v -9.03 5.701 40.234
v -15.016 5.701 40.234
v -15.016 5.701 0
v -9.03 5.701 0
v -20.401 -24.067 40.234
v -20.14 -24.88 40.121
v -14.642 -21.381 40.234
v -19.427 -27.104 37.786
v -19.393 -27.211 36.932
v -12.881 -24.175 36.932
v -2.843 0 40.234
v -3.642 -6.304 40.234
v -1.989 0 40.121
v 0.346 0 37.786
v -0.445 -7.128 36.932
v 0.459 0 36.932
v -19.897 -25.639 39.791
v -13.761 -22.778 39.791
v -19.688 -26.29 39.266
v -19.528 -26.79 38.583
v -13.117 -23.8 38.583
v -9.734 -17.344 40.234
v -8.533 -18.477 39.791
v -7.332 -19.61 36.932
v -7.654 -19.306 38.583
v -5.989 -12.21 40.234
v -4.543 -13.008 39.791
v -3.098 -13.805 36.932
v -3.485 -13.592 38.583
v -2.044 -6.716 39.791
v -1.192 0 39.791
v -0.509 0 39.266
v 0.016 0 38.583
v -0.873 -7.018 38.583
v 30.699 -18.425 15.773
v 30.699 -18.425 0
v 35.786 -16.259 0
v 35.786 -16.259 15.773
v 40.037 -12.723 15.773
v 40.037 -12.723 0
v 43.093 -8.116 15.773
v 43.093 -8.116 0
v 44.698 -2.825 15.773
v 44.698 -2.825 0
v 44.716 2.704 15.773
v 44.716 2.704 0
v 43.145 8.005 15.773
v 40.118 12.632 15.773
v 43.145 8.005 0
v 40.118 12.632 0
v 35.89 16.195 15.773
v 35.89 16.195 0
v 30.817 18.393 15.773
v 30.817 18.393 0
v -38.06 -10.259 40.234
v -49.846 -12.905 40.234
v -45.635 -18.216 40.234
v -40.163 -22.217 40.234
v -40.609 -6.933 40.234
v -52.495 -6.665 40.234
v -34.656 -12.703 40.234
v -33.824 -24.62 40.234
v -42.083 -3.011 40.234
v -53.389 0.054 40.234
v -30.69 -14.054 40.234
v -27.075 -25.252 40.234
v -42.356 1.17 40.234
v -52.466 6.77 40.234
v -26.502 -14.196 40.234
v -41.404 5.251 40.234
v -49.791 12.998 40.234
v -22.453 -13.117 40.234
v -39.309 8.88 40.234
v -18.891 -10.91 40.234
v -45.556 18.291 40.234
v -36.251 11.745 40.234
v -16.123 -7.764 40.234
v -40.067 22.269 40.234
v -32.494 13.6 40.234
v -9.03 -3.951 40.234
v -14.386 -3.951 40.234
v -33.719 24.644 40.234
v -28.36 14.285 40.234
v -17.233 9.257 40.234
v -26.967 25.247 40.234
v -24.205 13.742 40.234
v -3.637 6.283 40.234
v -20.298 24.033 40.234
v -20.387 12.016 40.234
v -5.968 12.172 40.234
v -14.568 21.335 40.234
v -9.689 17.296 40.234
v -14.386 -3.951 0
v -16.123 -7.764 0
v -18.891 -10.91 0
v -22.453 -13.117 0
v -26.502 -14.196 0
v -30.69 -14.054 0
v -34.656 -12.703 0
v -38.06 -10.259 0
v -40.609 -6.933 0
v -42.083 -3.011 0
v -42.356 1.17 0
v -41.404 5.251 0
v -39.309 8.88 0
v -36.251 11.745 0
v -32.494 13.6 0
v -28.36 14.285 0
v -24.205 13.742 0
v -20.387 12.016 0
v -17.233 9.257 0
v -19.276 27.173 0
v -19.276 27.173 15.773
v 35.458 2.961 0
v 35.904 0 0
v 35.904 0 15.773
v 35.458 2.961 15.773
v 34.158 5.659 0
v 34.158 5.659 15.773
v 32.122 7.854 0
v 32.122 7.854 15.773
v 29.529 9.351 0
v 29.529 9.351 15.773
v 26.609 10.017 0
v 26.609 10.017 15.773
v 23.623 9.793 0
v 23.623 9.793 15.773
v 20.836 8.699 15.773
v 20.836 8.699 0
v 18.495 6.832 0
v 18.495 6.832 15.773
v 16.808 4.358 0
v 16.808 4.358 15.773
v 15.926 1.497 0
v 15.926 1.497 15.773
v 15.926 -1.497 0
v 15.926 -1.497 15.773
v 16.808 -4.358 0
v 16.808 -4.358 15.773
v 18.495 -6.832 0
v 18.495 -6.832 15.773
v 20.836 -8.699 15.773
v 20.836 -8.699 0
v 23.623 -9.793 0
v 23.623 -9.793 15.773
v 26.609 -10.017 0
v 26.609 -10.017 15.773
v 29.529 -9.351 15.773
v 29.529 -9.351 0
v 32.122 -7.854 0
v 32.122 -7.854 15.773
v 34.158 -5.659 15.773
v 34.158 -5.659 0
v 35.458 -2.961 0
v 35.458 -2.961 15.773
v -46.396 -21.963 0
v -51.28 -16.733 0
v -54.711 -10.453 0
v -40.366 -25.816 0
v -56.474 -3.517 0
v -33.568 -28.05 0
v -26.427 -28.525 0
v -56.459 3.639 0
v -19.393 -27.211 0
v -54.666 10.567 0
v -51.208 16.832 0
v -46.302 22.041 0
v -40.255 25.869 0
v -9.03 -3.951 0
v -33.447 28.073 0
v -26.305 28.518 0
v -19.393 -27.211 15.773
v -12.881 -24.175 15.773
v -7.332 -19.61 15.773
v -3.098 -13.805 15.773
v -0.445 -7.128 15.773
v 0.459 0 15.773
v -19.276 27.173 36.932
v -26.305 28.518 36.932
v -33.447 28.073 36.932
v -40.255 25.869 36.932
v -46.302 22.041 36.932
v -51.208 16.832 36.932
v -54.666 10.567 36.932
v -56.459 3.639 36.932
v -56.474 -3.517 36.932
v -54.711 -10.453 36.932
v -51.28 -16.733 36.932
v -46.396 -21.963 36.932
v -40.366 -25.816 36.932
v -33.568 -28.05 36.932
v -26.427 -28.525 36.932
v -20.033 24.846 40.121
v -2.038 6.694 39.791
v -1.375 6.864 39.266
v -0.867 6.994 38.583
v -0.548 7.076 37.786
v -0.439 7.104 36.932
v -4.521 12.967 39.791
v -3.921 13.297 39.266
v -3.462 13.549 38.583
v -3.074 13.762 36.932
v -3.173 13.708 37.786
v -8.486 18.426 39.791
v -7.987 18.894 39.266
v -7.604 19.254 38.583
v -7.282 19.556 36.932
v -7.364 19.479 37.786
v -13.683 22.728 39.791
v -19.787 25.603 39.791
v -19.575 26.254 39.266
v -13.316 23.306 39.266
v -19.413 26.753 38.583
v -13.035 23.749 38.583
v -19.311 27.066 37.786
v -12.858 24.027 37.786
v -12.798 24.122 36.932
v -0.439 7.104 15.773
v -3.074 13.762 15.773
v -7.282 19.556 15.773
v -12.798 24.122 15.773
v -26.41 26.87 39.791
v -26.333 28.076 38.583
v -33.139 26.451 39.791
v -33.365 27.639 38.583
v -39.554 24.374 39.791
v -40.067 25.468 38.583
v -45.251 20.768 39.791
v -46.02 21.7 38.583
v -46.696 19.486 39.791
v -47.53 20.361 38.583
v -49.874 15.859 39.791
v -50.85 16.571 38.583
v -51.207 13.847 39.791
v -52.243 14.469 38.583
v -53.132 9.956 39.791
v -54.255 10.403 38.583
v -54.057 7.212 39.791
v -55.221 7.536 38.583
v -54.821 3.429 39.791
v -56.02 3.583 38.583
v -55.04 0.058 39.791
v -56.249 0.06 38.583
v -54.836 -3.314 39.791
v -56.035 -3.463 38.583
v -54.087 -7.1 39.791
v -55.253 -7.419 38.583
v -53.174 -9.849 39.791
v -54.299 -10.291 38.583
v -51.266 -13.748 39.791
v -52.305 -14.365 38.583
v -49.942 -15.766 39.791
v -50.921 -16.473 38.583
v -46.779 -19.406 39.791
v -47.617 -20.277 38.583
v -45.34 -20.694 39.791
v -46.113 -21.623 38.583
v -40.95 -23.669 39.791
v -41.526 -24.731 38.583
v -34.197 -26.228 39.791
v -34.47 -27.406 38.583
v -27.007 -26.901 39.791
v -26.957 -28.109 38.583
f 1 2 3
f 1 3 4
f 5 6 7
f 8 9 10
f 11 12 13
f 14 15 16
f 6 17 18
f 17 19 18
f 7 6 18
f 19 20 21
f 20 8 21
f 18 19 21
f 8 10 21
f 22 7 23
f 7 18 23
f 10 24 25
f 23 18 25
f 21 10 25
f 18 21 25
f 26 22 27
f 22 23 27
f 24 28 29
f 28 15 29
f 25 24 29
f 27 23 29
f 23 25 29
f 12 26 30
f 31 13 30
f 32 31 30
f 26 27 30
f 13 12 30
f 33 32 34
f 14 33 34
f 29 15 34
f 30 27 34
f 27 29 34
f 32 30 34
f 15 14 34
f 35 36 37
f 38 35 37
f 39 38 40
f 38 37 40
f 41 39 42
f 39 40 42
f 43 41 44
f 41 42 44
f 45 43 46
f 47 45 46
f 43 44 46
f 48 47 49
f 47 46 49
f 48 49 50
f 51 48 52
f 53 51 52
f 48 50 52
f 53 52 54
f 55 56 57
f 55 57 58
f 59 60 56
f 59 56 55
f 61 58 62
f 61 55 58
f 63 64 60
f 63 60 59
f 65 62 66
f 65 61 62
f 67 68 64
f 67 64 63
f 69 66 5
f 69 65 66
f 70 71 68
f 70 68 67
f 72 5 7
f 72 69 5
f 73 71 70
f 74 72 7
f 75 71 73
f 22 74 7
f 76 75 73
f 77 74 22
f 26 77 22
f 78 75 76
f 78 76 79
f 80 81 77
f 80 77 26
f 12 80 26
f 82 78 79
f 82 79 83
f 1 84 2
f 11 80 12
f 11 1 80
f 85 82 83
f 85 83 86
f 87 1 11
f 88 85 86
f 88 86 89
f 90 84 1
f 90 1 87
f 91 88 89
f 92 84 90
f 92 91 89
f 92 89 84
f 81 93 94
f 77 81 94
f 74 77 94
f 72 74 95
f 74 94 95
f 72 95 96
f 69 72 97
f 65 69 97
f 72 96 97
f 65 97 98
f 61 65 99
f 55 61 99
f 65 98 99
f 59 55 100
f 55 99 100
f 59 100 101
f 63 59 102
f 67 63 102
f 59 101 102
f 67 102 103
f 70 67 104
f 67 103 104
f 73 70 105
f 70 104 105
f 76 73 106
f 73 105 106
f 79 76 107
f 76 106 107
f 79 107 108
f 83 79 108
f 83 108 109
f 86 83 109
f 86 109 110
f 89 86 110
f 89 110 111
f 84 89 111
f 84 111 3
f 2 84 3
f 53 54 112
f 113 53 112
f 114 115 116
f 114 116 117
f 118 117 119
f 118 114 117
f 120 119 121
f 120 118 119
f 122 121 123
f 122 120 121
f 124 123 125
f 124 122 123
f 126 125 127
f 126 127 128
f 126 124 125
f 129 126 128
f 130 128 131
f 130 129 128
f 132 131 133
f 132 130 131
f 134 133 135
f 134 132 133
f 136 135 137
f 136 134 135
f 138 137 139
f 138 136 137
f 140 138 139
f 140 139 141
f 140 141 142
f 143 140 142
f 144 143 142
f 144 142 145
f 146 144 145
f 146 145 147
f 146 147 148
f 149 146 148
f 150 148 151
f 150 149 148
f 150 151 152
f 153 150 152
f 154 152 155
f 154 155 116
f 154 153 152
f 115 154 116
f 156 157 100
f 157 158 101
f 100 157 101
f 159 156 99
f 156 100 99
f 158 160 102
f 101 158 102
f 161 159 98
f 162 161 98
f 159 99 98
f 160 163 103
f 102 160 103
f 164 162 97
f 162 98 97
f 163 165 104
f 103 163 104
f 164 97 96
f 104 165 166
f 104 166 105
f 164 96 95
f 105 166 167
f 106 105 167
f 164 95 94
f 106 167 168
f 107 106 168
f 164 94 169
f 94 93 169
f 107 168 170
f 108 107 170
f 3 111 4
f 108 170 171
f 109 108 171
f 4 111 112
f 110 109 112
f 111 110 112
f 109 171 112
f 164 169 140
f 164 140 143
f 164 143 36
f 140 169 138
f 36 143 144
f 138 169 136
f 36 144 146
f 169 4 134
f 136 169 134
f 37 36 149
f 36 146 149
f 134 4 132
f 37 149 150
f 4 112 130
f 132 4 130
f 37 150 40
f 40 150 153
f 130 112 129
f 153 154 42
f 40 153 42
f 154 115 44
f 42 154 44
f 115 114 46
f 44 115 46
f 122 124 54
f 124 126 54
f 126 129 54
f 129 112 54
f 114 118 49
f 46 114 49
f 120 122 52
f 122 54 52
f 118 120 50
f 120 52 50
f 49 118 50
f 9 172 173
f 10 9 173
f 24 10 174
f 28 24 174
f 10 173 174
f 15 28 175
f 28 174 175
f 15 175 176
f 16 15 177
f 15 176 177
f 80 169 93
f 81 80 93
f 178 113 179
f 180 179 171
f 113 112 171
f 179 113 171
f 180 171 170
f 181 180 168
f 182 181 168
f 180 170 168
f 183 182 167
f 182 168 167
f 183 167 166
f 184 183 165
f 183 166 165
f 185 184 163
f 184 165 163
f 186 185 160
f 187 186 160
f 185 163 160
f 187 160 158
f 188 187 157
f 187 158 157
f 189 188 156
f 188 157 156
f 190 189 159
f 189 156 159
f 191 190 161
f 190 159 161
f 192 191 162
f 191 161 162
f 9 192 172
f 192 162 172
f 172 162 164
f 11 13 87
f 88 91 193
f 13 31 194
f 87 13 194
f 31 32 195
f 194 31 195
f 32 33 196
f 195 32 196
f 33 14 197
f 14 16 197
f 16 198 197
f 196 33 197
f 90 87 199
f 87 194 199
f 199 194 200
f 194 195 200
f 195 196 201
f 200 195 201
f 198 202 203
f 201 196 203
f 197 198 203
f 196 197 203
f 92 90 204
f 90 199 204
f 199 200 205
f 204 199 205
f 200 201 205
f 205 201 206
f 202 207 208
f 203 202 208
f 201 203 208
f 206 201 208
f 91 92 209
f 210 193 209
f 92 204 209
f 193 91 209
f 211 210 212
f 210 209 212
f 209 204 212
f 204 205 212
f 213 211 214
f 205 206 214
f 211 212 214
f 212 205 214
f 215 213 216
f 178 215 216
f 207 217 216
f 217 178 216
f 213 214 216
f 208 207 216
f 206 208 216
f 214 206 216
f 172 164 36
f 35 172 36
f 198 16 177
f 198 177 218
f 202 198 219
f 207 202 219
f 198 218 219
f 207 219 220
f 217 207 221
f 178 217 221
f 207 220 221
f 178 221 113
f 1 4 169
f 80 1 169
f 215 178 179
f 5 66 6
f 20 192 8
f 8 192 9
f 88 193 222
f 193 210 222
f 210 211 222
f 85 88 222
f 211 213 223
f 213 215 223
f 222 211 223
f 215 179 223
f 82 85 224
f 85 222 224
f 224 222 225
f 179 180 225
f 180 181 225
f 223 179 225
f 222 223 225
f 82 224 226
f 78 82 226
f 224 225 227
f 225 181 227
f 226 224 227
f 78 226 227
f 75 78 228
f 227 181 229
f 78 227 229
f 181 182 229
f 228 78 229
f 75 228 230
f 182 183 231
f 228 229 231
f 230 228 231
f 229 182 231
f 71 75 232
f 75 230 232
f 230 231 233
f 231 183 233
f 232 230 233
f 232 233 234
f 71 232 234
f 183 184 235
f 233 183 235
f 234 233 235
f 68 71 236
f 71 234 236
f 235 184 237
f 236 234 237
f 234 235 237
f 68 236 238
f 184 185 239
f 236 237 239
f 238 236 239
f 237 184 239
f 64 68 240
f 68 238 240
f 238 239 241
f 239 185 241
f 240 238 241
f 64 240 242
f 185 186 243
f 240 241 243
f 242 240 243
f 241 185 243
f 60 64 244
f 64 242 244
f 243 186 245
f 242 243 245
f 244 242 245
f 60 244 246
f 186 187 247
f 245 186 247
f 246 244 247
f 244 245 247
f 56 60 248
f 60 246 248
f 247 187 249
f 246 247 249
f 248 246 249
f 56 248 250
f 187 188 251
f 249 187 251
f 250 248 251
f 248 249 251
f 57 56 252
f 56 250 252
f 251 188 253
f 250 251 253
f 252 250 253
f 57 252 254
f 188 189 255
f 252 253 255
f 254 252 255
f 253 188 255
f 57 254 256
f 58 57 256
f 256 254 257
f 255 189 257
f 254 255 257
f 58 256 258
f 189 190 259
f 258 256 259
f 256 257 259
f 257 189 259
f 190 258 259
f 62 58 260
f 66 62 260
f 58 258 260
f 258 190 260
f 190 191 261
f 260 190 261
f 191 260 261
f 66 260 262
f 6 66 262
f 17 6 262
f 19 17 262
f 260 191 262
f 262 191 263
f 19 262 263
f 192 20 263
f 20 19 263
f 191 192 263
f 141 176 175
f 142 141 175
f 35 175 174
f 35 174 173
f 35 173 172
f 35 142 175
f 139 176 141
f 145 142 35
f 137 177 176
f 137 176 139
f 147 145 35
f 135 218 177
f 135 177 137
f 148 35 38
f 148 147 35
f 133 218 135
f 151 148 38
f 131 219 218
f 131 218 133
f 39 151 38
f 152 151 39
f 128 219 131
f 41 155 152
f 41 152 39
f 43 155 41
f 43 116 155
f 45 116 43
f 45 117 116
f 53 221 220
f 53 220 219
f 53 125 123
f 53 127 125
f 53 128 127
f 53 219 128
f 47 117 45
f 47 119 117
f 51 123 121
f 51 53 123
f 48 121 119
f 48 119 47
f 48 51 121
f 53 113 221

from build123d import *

# Parameters (mm, degrees)
F0_R     = 10.045225
F1_DEPTH = 15.7734
F2_DEPTH = 40.2336
F3_R     = 3.302


with BuildPart() as f1:
    # F0 (on Top) → F1 (new body)
    with BuildSketch(Plane.XY):
        with BuildLine():
            ThreePointArc((-19.276231, 27.17319), (-4.995638, 16.791712), (0.458613, 0))
            ThreePointArc((0.458613, 0), (-5.031754, -16.841329), (-19.39303, -27.210911))
            Line((-19.39303, -27.210911), (30.698986, -18.424801))
            ThreePointArc((30.698986, -18.424801), (44.908516, -0.061007), (30.816896, 18.393421))
            Line((30.816896, 18.393421), (-19.276231, 27.17319))
        make_face()
        with Locations((25.858613, 0)):
            Circle(F0_R, mode=Mode.SUBTRACT)
    extrude(amount=F1_DEPTH)

    # F0 (on Top) → F2 (join)
    with BuildSketch(Plane.XY):
        with BuildLine():
            ThreePointArc((-19.39303, -27.210911), (-5.031754, -16.841329), (0.458613, 0))
            ThreePointArc((0.458613, 0), (-4.995638, 16.791712), (-19.276231, 27.17319))
            ThreePointArc((-19.276231, 27.17319), (-56.691321, 0.061369), (-19.39303, -27.210911))
        make_face()
        with BuildLine():
            ThreePointArc((-14.385945, -3.95065), (-42.37357, -0.930265), (-15.015728, 5.70135))
            Line((-15.015728, 5.70135), (-9.030028, 5.70135))
            Line((-9.030028, 5.70135), (-9.030028, -3.95065))
            Line((-9.030028, -3.95065), (-14.385945, -3.95065))
        make_face(mode=Mode.SUBTRACT)
    extrude(amount=F2_DEPTH)

    # F3
    f3_edges = [f1.edges().sort_by_distance(p)[0] for p in [
        (-36.839744, 27.210911, 40.2336),
    ]]
    fillet(f3_edges, radius=F3_R)


solid = f1.part
